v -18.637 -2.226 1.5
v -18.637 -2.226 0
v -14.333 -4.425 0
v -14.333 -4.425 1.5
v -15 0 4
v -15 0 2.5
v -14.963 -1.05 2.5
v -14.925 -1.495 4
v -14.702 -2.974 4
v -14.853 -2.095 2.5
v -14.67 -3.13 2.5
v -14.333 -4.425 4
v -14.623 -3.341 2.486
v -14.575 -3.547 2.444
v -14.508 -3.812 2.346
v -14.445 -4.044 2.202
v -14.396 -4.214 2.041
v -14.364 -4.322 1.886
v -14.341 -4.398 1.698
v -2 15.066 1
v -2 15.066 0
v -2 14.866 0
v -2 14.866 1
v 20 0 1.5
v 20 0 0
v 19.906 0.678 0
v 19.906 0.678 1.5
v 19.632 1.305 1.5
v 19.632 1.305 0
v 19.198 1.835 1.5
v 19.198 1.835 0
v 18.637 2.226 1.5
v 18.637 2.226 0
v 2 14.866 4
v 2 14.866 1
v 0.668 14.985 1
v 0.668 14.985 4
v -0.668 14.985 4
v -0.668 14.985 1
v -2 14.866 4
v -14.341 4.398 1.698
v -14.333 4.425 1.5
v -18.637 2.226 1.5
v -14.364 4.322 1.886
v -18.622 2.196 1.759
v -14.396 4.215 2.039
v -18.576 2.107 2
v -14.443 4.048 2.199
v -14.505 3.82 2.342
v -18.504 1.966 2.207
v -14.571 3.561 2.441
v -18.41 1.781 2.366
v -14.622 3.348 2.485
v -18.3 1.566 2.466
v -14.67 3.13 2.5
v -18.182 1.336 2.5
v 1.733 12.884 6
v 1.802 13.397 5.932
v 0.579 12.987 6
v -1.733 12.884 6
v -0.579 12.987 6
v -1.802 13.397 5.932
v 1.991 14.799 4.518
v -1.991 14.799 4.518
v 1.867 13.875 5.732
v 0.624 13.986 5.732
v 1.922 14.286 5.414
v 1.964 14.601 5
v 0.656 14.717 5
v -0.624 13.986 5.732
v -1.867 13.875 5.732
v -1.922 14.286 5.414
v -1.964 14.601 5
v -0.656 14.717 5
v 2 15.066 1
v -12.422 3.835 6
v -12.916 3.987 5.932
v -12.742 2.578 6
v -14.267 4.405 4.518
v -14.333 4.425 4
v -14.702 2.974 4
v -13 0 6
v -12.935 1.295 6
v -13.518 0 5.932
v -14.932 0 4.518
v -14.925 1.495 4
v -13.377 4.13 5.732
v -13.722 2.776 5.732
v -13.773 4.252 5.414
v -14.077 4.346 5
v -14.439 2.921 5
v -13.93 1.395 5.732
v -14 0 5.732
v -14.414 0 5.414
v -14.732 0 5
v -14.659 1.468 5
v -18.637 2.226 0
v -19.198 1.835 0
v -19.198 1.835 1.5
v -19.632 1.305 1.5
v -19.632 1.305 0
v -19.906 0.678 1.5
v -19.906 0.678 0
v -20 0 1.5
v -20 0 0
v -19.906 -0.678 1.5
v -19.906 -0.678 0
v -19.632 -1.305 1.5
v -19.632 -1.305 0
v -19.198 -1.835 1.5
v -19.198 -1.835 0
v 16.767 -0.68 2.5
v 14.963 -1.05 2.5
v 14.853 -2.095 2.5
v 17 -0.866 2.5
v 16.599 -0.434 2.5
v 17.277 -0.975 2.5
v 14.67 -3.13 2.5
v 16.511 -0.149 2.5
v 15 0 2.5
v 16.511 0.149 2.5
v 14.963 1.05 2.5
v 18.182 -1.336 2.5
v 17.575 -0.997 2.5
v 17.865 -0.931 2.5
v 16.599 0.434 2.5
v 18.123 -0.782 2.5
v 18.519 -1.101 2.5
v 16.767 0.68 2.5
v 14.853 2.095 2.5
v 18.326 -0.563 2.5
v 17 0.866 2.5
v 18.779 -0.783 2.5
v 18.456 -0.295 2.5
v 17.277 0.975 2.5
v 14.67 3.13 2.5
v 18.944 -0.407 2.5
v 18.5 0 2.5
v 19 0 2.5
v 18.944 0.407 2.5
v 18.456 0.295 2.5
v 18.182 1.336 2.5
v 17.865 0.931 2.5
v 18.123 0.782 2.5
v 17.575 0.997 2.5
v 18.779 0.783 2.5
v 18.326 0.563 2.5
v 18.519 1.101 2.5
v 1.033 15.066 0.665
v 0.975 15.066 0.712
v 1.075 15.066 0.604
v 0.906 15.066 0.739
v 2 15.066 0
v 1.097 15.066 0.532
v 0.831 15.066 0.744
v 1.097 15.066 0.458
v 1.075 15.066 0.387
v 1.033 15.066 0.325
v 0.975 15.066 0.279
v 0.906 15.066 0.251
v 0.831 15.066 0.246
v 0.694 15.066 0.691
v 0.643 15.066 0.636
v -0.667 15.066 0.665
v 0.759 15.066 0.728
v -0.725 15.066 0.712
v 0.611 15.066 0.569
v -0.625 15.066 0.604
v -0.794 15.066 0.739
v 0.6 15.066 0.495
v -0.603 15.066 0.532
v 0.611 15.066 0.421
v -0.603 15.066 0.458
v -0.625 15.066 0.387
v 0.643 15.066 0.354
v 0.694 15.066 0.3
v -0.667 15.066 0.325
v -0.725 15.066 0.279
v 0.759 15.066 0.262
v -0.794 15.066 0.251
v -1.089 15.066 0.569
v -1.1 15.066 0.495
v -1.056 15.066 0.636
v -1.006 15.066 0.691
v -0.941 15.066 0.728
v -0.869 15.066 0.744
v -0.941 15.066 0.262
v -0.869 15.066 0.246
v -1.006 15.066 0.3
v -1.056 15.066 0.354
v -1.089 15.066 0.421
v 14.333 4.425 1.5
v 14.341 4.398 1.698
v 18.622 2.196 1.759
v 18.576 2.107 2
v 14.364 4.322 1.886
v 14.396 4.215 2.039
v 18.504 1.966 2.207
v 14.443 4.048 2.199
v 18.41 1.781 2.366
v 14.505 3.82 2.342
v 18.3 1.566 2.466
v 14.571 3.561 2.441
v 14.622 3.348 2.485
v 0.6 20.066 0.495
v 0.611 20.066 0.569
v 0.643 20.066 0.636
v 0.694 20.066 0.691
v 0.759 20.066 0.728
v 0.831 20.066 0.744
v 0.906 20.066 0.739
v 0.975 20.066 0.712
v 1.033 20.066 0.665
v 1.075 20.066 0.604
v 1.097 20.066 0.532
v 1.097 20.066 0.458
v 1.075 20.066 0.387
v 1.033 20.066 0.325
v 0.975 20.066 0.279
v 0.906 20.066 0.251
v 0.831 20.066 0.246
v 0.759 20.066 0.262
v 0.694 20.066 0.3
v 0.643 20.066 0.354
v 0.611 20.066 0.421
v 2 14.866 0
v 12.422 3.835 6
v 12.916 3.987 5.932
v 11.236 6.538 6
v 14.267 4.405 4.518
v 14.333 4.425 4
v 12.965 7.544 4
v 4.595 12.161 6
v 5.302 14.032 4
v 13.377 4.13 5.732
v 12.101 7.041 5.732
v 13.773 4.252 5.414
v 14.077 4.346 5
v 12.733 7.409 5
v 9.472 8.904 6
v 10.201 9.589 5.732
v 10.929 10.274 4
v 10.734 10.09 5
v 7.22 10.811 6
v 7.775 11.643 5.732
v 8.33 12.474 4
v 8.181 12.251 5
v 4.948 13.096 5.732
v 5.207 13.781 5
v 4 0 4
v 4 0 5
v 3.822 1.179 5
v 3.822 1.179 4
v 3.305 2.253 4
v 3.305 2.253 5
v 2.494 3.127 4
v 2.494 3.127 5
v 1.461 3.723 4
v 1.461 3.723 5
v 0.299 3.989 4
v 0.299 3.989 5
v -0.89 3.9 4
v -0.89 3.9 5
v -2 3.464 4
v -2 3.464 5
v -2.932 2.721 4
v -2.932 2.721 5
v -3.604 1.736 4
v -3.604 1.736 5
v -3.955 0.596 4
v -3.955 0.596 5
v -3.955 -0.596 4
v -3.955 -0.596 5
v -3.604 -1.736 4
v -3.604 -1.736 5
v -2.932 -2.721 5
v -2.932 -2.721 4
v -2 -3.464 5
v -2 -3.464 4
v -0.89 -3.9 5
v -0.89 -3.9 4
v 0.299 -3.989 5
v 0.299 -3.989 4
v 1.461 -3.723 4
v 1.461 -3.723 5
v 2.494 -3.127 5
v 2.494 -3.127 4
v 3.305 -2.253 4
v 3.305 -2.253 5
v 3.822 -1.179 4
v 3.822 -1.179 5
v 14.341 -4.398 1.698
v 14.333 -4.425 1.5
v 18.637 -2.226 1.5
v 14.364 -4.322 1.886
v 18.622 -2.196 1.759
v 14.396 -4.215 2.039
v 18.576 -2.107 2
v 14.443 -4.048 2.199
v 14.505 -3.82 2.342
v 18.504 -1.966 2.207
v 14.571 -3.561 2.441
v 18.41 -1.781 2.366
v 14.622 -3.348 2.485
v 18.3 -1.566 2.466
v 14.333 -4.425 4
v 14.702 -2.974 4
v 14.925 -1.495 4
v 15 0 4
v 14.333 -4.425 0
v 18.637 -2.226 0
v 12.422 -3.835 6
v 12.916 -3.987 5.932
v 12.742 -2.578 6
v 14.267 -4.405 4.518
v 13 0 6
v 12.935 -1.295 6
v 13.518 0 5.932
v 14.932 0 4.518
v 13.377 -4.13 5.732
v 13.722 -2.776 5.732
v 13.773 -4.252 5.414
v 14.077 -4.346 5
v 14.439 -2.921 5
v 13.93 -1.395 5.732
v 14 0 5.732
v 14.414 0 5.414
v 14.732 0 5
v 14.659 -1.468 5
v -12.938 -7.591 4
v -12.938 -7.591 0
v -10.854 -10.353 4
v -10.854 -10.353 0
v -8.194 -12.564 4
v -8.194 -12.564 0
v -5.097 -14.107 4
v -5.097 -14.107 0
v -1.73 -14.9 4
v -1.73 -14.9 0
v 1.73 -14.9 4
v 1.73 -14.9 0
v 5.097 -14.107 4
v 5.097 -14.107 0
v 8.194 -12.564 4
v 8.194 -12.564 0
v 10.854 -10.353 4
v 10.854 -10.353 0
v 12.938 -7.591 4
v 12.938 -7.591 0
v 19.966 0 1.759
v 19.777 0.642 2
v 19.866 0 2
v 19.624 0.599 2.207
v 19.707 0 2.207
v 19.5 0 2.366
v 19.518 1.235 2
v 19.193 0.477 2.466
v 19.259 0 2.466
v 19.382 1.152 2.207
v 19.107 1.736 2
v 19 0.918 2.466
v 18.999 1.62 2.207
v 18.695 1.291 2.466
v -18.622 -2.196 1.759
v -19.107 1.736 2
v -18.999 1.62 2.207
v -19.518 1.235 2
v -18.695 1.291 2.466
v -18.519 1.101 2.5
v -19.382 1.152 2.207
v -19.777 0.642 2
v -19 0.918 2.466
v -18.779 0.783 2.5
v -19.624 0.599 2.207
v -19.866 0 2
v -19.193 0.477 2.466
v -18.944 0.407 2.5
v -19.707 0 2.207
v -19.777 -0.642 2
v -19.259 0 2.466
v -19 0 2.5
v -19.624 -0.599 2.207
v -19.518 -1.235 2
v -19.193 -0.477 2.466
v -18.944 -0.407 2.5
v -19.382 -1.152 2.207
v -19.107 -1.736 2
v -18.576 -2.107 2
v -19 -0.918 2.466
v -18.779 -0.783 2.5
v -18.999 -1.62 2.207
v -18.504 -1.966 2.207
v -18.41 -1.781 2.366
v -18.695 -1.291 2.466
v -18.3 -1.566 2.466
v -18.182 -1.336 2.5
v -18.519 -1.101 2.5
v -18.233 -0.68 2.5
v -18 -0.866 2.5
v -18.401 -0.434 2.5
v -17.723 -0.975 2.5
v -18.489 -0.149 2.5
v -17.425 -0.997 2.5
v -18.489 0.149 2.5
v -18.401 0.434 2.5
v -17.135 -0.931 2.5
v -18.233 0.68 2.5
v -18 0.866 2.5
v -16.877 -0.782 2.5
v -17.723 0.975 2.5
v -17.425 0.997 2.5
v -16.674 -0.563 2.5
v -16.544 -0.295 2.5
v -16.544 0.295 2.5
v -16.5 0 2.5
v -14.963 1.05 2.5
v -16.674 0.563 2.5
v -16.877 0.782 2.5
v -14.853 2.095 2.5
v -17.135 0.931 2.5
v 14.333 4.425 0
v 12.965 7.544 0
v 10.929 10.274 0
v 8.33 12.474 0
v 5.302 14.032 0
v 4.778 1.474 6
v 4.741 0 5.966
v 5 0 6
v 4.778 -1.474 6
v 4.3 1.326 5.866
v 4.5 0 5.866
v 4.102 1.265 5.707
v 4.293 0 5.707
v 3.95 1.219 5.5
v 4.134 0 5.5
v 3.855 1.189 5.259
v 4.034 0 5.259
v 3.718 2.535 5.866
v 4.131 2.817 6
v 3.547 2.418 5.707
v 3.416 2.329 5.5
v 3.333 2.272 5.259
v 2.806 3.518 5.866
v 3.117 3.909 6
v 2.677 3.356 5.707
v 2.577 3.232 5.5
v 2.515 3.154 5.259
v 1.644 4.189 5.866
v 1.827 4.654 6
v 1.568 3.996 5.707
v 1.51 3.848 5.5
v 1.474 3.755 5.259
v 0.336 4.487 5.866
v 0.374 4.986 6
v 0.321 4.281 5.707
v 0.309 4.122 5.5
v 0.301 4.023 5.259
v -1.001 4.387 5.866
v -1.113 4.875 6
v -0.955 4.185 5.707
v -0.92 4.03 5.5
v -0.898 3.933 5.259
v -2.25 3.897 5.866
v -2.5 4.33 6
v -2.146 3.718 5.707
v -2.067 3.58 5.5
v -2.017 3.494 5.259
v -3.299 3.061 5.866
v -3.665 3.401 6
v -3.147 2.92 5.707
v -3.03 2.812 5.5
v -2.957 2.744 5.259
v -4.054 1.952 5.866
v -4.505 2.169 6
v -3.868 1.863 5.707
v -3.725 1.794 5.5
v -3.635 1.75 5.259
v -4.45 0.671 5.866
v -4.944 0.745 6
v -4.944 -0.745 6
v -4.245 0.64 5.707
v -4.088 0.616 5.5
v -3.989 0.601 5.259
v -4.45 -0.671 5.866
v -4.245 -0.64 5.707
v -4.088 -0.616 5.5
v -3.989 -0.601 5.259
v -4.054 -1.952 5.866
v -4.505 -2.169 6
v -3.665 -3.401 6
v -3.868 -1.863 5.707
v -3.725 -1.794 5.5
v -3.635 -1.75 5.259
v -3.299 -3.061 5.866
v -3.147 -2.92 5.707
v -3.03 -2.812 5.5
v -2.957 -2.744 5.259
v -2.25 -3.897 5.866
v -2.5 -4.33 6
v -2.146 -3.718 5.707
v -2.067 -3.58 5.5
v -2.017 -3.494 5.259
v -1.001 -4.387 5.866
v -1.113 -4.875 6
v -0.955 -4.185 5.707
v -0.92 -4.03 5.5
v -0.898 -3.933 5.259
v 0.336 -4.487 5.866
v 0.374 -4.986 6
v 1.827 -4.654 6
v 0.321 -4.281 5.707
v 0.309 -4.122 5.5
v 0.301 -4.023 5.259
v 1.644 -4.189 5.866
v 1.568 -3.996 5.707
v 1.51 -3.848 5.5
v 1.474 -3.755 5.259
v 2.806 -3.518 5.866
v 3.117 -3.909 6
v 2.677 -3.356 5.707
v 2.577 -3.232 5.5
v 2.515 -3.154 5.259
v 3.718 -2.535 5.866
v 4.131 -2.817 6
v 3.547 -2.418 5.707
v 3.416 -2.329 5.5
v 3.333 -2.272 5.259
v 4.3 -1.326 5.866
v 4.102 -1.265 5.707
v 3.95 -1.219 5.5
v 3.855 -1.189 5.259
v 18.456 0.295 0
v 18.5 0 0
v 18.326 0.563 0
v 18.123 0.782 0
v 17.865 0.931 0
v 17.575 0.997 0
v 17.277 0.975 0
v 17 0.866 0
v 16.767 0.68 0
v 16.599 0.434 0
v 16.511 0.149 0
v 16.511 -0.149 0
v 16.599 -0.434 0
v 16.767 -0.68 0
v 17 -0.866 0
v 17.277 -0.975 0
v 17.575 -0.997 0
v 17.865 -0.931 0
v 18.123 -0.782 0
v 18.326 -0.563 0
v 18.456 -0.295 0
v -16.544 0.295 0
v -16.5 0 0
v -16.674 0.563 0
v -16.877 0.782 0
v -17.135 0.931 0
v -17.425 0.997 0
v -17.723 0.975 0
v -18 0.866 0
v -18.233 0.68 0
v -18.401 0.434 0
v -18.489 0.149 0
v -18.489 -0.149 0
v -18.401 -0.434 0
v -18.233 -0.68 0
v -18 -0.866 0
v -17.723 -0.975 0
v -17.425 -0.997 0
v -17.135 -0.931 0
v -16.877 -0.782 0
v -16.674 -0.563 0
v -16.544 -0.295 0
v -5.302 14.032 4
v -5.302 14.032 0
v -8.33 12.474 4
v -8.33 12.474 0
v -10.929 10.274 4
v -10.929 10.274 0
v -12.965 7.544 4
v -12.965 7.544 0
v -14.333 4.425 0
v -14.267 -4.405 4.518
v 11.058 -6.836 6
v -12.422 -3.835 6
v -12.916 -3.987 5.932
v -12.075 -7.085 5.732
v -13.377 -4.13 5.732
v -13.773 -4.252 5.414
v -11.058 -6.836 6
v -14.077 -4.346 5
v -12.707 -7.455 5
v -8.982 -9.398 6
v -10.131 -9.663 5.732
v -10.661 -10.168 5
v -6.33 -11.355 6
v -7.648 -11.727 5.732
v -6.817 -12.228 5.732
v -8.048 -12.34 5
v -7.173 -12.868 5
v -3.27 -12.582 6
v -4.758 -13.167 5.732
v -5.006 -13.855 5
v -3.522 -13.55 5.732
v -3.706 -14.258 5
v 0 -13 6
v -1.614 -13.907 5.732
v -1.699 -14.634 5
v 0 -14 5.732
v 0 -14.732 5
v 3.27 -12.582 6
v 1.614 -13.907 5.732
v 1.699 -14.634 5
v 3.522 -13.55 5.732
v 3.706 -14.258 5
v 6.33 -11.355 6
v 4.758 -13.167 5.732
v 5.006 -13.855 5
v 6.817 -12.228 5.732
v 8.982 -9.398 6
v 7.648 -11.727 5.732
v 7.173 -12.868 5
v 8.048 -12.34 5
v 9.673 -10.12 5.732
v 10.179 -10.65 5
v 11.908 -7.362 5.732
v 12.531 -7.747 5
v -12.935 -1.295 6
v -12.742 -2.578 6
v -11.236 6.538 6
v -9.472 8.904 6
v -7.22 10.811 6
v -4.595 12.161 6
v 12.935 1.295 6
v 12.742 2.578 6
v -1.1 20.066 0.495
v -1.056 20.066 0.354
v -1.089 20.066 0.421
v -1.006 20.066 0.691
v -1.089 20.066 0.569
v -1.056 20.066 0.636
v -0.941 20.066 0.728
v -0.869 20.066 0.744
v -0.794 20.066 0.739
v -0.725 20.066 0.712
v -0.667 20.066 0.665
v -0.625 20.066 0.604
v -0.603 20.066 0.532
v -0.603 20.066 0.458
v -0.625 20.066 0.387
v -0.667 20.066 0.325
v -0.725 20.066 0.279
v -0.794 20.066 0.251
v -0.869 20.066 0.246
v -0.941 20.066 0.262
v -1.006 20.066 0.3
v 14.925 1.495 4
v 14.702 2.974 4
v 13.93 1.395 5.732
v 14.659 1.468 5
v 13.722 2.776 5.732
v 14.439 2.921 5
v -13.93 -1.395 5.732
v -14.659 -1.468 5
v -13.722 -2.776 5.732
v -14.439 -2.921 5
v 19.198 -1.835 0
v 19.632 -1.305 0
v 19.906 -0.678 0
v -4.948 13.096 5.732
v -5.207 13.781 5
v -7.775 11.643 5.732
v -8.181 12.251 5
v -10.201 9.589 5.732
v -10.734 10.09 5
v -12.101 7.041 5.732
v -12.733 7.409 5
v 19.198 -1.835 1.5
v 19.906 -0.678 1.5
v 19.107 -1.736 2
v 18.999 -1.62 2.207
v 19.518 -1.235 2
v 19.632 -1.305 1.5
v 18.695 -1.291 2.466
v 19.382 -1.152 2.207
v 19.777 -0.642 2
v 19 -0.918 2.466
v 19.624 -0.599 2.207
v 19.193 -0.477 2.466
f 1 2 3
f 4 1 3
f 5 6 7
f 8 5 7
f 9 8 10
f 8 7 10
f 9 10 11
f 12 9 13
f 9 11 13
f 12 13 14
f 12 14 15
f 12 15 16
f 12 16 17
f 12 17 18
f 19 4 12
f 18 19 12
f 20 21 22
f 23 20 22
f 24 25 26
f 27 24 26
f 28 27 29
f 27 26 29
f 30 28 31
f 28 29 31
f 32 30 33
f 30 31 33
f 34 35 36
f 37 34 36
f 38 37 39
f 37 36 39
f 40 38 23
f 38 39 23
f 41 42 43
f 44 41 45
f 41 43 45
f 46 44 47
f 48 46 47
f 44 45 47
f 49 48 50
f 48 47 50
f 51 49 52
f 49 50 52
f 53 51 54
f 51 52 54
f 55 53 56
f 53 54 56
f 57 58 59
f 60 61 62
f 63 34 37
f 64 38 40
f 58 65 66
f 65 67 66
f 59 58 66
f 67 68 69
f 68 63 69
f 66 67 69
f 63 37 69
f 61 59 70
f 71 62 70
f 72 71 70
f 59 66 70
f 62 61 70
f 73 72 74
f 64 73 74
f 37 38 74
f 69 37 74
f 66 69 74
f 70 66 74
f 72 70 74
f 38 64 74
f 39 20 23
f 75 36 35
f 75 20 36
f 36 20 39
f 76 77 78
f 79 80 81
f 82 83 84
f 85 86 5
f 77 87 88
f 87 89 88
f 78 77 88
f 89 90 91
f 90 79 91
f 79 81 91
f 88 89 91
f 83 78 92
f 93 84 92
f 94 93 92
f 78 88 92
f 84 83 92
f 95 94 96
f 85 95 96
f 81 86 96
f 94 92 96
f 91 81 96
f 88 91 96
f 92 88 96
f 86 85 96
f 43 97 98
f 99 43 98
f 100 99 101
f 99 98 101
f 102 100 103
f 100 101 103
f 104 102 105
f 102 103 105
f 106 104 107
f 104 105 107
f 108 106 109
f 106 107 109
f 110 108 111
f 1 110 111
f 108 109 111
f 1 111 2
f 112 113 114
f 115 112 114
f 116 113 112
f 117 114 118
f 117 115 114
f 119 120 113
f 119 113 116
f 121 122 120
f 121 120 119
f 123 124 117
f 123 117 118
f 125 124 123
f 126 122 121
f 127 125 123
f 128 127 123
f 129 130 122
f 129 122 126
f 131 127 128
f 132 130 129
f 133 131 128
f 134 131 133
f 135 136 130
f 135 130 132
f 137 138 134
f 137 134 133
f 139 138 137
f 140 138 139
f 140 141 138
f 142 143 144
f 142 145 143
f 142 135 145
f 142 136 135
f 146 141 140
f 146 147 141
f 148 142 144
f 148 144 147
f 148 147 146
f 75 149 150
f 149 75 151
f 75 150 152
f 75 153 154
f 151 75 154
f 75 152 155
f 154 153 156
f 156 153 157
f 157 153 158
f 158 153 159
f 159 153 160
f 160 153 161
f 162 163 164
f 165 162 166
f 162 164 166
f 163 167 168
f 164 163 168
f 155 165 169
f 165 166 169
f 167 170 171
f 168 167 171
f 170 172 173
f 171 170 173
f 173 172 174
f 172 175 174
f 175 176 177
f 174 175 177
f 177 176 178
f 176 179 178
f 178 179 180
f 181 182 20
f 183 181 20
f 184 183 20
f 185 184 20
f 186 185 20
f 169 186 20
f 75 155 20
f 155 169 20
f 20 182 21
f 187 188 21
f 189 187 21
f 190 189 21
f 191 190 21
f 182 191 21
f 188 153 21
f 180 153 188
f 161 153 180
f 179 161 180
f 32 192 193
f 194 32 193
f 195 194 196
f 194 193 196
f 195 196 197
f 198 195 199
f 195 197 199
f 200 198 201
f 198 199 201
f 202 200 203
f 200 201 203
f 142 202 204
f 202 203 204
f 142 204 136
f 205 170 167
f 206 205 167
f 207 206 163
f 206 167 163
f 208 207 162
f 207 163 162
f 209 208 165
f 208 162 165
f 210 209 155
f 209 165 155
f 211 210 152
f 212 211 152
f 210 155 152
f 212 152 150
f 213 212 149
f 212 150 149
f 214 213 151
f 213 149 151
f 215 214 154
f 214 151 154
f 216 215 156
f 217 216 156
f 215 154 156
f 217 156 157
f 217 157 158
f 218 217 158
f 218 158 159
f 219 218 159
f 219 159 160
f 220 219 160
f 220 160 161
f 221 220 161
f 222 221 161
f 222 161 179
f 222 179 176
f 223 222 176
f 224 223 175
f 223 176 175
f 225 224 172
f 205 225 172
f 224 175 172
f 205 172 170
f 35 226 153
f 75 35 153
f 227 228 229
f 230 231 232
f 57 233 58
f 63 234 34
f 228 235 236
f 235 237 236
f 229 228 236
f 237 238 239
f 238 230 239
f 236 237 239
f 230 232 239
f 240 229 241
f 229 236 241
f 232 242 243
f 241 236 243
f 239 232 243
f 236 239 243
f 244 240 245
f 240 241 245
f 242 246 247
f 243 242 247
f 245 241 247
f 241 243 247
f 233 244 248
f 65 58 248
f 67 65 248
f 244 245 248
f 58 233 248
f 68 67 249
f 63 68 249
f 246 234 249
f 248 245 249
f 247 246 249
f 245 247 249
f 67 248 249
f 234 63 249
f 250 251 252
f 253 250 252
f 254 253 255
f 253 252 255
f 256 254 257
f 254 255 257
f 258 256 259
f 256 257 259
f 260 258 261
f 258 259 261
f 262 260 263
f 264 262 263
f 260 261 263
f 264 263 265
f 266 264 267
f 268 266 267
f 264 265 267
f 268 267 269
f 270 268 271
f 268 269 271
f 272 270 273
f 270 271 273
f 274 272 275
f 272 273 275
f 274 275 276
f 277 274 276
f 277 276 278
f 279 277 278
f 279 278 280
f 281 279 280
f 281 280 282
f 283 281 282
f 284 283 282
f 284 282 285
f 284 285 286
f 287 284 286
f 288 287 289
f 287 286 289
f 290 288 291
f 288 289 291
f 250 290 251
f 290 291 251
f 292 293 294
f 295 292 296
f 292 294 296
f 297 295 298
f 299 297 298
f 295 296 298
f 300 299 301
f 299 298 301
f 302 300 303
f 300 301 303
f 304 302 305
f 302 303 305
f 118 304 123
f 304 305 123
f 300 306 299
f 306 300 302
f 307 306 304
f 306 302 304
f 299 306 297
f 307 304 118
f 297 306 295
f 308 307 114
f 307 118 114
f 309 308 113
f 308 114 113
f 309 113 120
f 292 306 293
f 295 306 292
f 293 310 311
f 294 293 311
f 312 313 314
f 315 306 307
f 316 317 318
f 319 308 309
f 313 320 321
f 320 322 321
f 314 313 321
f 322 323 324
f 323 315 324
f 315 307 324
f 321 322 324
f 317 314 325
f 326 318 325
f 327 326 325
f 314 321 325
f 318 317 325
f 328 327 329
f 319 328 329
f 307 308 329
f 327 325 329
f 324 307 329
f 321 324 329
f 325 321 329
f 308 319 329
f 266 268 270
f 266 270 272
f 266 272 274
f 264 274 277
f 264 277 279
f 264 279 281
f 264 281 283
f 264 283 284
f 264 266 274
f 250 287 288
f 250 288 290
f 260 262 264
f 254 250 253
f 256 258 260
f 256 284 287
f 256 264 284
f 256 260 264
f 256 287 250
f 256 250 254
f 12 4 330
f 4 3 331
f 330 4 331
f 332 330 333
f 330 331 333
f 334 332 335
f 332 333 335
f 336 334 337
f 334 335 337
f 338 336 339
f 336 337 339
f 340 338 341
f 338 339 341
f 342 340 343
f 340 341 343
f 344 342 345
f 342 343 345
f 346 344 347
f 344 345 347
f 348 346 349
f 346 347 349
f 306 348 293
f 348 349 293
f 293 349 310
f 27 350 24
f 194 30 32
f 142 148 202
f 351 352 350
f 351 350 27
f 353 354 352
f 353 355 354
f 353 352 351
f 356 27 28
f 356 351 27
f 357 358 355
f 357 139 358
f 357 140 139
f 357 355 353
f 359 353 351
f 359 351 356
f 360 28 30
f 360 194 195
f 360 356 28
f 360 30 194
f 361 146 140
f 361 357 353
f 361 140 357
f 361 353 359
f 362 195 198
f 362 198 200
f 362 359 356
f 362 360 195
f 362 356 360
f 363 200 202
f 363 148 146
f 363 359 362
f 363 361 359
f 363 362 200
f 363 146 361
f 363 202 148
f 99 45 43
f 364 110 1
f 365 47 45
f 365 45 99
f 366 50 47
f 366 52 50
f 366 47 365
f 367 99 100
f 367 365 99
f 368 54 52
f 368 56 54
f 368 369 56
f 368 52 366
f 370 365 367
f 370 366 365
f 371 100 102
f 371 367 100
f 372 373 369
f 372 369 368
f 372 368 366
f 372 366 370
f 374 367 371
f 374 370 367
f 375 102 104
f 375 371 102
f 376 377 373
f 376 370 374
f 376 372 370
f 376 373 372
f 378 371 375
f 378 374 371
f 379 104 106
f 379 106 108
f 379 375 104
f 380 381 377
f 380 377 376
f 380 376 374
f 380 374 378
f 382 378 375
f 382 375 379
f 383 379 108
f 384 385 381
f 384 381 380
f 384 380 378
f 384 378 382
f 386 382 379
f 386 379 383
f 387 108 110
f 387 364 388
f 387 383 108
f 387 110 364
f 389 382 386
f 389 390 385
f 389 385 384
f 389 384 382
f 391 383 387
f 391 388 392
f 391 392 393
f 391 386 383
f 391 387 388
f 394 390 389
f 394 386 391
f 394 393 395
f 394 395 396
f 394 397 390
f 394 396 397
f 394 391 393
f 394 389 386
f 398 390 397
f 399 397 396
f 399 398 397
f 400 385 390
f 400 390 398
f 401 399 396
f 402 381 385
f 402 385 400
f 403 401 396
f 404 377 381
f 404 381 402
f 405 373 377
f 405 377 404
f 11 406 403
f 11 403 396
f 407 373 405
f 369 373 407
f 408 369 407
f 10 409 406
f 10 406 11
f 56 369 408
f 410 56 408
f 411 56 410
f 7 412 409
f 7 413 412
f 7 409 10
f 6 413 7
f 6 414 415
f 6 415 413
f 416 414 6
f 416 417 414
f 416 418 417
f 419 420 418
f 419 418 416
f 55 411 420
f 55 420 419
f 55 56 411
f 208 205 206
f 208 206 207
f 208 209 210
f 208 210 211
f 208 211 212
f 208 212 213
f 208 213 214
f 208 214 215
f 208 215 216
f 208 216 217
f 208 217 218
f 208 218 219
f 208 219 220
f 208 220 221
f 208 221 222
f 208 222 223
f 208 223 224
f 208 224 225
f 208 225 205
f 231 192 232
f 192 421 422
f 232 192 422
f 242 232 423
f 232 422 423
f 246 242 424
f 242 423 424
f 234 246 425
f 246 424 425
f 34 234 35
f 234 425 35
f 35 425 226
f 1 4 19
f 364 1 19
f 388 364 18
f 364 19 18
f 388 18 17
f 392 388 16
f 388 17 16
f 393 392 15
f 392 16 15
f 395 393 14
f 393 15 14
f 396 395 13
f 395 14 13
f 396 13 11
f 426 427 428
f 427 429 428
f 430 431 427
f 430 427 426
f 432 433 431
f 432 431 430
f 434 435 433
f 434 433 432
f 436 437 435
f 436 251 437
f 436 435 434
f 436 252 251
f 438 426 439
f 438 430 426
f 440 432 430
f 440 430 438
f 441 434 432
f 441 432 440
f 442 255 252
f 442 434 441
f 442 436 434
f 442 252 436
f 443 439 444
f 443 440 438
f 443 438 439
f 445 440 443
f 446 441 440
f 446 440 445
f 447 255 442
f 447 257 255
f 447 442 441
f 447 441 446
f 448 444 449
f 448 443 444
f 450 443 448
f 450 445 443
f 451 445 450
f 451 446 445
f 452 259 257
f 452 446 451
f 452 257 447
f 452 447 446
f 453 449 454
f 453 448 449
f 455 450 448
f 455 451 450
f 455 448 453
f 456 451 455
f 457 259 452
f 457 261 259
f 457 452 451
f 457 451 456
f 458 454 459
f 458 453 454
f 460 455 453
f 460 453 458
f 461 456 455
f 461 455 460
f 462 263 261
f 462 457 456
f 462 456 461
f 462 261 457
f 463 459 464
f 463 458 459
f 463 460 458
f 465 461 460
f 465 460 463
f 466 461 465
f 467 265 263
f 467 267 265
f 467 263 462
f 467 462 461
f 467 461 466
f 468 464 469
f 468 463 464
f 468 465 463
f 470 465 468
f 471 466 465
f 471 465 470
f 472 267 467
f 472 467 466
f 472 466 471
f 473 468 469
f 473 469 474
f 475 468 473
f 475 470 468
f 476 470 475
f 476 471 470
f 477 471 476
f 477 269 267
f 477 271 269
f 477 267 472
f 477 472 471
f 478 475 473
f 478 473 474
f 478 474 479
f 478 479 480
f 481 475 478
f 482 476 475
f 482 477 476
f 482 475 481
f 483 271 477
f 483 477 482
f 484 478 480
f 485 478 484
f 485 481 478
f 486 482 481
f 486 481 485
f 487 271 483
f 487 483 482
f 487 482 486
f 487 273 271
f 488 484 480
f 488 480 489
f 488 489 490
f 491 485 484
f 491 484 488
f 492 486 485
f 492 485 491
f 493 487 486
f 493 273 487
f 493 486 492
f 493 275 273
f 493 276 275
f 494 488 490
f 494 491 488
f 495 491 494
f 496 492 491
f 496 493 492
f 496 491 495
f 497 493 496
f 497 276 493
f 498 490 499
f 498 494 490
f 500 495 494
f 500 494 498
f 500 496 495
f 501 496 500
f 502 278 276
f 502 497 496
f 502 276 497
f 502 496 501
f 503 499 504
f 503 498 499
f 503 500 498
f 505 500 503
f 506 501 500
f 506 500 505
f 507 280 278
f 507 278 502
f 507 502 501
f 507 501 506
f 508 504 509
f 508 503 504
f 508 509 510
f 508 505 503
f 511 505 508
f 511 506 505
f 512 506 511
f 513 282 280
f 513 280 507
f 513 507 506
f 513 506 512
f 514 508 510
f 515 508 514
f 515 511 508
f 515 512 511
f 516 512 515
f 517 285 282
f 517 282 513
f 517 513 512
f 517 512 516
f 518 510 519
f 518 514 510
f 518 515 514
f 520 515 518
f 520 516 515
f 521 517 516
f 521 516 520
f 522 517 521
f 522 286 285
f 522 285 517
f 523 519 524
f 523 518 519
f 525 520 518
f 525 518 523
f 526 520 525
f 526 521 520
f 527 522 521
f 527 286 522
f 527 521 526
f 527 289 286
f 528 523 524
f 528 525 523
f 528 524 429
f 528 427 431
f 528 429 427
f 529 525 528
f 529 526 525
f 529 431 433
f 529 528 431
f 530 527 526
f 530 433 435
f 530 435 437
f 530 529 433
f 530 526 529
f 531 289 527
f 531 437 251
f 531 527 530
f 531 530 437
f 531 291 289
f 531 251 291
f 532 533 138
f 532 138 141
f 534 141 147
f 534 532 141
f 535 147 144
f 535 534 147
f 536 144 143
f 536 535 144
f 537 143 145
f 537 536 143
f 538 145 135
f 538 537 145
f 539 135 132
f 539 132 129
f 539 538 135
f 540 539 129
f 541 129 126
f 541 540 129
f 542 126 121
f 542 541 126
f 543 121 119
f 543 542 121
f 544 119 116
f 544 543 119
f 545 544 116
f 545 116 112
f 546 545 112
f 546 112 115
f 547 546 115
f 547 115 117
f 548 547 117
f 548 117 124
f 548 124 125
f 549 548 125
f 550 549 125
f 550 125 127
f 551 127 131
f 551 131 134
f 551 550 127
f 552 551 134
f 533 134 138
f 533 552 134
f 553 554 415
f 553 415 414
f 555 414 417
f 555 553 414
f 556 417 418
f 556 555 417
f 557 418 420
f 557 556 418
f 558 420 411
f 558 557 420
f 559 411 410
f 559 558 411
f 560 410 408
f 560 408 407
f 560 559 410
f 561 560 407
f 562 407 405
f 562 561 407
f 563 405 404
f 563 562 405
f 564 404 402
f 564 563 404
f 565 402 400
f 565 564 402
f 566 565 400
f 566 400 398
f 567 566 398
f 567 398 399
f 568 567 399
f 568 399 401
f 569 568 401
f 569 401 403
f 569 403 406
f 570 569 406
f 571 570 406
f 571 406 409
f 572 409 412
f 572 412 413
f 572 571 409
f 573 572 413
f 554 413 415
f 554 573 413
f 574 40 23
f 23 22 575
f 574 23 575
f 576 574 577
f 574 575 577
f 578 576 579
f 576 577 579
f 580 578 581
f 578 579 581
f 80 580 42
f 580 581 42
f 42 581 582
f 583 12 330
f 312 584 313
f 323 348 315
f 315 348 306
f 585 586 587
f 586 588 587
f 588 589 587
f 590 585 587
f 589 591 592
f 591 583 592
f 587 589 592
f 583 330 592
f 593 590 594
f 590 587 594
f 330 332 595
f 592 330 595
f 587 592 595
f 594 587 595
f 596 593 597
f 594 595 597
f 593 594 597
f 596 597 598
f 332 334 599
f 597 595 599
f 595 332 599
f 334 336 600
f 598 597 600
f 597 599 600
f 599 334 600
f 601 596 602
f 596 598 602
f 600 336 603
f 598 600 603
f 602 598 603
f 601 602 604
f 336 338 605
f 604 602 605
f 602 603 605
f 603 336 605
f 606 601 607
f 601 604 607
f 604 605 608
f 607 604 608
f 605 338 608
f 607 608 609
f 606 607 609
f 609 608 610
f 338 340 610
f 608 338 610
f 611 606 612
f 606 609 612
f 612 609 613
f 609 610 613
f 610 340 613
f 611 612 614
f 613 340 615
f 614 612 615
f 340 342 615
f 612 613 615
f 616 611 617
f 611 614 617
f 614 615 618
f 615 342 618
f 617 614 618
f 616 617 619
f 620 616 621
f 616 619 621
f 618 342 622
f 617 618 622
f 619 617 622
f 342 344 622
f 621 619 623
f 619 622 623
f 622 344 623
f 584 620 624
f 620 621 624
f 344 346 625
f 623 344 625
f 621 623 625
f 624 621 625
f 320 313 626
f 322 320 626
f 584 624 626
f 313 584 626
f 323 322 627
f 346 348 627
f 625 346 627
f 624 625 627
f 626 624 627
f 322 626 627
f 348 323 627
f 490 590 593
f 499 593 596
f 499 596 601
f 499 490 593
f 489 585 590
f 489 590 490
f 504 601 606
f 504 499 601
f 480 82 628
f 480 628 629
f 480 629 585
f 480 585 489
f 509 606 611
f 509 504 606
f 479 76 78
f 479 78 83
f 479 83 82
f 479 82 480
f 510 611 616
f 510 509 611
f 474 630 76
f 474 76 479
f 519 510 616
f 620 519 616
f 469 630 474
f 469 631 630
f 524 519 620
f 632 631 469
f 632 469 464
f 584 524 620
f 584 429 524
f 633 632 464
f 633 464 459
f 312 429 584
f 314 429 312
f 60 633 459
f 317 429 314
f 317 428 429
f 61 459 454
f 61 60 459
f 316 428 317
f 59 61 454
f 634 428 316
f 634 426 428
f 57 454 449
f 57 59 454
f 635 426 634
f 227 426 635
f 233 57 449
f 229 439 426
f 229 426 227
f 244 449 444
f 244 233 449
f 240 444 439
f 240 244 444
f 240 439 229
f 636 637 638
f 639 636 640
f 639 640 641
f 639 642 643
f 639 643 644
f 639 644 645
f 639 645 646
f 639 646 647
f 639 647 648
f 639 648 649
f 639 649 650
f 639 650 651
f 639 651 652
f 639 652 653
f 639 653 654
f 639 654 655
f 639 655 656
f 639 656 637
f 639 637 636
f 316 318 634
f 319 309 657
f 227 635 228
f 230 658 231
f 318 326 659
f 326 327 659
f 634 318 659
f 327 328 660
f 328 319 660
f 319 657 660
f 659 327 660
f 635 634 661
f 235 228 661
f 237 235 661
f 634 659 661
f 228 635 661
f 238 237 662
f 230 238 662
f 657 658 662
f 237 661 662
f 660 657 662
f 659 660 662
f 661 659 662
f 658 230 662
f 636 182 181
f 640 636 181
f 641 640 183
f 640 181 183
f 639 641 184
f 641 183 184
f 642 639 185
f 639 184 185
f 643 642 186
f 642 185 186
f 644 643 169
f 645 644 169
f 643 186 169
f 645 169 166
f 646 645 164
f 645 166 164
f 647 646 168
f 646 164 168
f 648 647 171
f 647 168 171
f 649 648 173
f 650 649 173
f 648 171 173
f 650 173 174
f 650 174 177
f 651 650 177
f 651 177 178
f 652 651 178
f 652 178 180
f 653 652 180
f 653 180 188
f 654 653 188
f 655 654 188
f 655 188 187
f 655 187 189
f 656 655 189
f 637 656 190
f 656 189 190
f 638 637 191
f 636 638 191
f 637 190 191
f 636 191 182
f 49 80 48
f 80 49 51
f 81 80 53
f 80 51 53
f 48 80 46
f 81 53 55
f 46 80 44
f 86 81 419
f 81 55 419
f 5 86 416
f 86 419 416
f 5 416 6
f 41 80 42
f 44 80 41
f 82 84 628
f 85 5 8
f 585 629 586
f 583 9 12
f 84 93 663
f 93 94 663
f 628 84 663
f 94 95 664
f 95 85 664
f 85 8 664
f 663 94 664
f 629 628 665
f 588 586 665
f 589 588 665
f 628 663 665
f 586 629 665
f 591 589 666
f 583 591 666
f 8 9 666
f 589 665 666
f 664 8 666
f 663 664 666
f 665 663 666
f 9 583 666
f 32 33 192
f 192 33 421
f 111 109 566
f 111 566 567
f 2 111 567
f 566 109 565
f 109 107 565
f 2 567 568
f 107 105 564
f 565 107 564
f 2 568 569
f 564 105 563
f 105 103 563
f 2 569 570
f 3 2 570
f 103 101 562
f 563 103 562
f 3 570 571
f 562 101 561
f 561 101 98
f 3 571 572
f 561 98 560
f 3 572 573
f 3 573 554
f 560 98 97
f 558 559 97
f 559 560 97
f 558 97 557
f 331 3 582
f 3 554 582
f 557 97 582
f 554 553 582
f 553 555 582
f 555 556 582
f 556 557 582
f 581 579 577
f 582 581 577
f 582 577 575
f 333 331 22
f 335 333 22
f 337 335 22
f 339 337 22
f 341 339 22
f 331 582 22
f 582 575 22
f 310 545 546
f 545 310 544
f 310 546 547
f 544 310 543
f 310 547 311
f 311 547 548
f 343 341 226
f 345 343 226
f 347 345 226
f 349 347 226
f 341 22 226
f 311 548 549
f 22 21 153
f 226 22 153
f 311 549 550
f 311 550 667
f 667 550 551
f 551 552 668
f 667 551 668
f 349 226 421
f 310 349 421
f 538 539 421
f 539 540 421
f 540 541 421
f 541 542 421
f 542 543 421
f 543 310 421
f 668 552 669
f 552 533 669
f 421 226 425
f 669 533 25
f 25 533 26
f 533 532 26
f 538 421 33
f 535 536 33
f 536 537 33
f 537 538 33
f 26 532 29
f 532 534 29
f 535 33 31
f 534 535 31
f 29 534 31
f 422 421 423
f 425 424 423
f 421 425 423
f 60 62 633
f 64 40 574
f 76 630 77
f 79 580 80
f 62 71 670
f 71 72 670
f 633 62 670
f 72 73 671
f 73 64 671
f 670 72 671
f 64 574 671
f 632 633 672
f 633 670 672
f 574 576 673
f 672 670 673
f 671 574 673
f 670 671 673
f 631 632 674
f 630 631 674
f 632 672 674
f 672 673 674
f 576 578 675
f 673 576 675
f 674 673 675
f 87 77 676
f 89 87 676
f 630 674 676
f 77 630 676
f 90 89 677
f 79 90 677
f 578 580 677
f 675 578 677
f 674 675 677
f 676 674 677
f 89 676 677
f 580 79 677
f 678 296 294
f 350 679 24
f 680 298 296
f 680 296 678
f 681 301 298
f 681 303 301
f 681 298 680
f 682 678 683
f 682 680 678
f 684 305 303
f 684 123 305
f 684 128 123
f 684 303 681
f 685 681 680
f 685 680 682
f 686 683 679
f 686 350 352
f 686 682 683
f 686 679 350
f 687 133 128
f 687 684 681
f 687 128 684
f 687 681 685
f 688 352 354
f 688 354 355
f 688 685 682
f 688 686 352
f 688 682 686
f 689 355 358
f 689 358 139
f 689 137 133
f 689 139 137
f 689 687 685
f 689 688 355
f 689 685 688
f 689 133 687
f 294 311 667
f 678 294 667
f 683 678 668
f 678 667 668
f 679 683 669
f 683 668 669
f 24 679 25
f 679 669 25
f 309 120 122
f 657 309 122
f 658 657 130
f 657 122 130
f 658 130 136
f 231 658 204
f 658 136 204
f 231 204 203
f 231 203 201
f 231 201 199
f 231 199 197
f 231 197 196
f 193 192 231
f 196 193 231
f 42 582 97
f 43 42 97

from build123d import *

# Parameters (mm, degrees)
F1_DEPTH = 6
F0_R     = 1
F2_DEPTH = 2.5
F3_R     = 4
F4_DEPTH = 2
F5_R     = 2
F6_DEPTH = 1
F7_R     = 0.25
F8_DEPTH = 5
F9_R     = 1


with BuildPart() as f1:
    # F0 (on Top) → F1 (new body)
    with BuildSketch(Plane.XY):
        with BuildLine():
            ThreePointArc((14.3325547763, -4.4246890947), (14.8322001342, -2.2373732764), (15, 0))
            ThreePointArc((15, 0), (14.8322001342, 2.2373732764), (14.3325547763, 4.4246890947))
            ThreePointArc((14.3325547763, 4.4246890947), (9.6924552433, 11.447982851), (2, 14.8660687473))
            ThreePointArc((2, 14.8660687473), (0, 15), (-2, 14.8660687473))
            ThreePointArc((-2, 14.8660687473), (-9.6924552433, 11.447982851), (-14.3325547763, 4.4246890947))
            ThreePointArc((-14.3325547763, 4.4246890947), (-14.8322001342, 2.2373732764), (-15, 0))
            ThreePointArc((-15, 0), (-14.8322001342, -2.2373732764), (-14.3325547763, -4.4246890947))
            ThreePointArc((-14.3325547763, -4.4246890947), (0, -15), (14.3325547763, -4.4246890947))
        make_face()
    extrude(amount=F1_DEPTH)

    # F0 (on Top) → F2 (join)
    with BuildSketch(Plane.XY):
        with BuildLine():
            ThreePointArc((-18.6370210525, 2.2264732485), (-16.1947323323, 2.132199877), (-15, 0))
            ThreePointArc((-15, 0), (-14.8322001342, 2.2373732764), (-14.3325547763, 4.4246890947))
            Line((-14.3325547763, 4.4246890947), (-18.6370210525, 2.2264732485))
        make_face()
        with BuildLine():
            ThreePointArc((-18.6370210525, -2.2264732485), (-16.1947323323, -2.132199877), (-15, 0))
            ThreePointArc((-15, 0), (-16.1947323323, 2.132199877), (-18.6370210525, 2.2264732485))
            ThreePointArc((-18.6370210525, 2.2264732485), (-20, 0), (-18.6370210525, -2.2264732485))
        make_face()
        with Locations((-17.5, 0)):
            Circle(F0_R, mode=Mode.SUBTRACT)
        with BuildLine():
            ThreePointArc((14.3325547763, 4.4246890947), (14.8322001342, 2.2373732764), (15, 0))
            ThreePointArc((15, 0), (16.1947323323, 2.132199877), (18.6370210525, 2.2264732485))
            Line((18.6370210525, 2.2264732485), (14.3325547763, 4.4246890947))
        make_face()
        with BuildLine():
            ThreePointArc((18.6370210525, 2.2264732485), (16.1947323323, 2.132199877), (15, 0))
            ThreePointArc((15, 0), (16.1947323323, -2.132199877), (18.6370210525, -2.2264732485))
            ThreePointArc((18.6370210525, -2.2264732485), (19.632199877, -1.3052676677), (20, 0))
            ThreePointArc((20, 0), (19.632199877, 1.3052676677), (18.6370210525, 2.2264732485))
        make_face()
        with Locations((17.5, 0)):
            Circle(F0_R, mode=Mode.SUBTRACT)
        with BuildLine():
            ThreePointArc((18.6370210525, -2.2264732485), (16.1947323323, -2.132199877), (15, 0))
            ThreePointArc((15, 0), (14.8322001342, -2.2373732764), (14.3325547763, -4.4246890947))
            Line((14.3325547763, -4.4246890947), (18.6370210525, -2.2264732485))
        make_face()
        with BuildLine():
            Line((-18.6370210525, -2.2264732485), (-14.3325547763, -4.4246890947))
            ThreePointArc((-14.3325547763, -4.4246890947), (-14.8322001342, -2.2373732764), (-15, 0))
            ThreePointArc((-15, 0), (-16.1947323323, -2.132199877), (-18.6370210525, -2.2264732485))
        make_face()
    extrude(amount=F2_DEPTH)

    # F3 (on face) → F4 (cut)
    with BuildSketch(Plane.XY.offset(6)):
        Circle(F3_R)
    extrude(amount=-F4_DEPTH, mode=Mode.SUBTRACT)

    # F5
    f5_edges = [f1.edges().sort_by_distance(p)[0] for p in [
        (15, 0, 6),
    ]]
    fillet(f5_edges, radius=F5_R)

    # F0 (on Top) → F6 (join)
    with BuildSketch(Plane.XY):
        with BuildLine():
            ThreePointArc((-2, 14.8660687473), (0, 15), (2, 14.8660687473))
            Line((2, 14.8660687473), (2, 15.0660687473))
            Line((2, 15.0660687473), (0, 15.0660687473))
            Line((0, 15.0660687473), (-2, 15.0660687473))
            Line((-2, 15.0660687473), (-2, 14.8660687473))
        make_face()
    extrude(amount=F6_DEPTH)

    # F7 (on face) → F8 (join)
    with BuildSketch(Plane(origin=(0, 15.0660687473, 0), x_dir=(-1, 0, 0), z_dir=(0, 1, 0))):
        with Locations((-0.8499287069, 0.4951201845)):
            Circle(F7_R)
        with Locations((0.8499287069, 0.4951201845)):
            Circle(F7_R)
    extrude(amount=F8_DEPTH)

    # F9
    f9_edges = [f1.edges().sort_by_distance(p)[0] for p in [
        (16.484788, -3.325581, 2.5),
        (-16.484788, 3.325581, 2.5),
        (-4, 0, 6),
    ]]
    fillet(f9_edges, radius=F9_R)


solid = f1.part
